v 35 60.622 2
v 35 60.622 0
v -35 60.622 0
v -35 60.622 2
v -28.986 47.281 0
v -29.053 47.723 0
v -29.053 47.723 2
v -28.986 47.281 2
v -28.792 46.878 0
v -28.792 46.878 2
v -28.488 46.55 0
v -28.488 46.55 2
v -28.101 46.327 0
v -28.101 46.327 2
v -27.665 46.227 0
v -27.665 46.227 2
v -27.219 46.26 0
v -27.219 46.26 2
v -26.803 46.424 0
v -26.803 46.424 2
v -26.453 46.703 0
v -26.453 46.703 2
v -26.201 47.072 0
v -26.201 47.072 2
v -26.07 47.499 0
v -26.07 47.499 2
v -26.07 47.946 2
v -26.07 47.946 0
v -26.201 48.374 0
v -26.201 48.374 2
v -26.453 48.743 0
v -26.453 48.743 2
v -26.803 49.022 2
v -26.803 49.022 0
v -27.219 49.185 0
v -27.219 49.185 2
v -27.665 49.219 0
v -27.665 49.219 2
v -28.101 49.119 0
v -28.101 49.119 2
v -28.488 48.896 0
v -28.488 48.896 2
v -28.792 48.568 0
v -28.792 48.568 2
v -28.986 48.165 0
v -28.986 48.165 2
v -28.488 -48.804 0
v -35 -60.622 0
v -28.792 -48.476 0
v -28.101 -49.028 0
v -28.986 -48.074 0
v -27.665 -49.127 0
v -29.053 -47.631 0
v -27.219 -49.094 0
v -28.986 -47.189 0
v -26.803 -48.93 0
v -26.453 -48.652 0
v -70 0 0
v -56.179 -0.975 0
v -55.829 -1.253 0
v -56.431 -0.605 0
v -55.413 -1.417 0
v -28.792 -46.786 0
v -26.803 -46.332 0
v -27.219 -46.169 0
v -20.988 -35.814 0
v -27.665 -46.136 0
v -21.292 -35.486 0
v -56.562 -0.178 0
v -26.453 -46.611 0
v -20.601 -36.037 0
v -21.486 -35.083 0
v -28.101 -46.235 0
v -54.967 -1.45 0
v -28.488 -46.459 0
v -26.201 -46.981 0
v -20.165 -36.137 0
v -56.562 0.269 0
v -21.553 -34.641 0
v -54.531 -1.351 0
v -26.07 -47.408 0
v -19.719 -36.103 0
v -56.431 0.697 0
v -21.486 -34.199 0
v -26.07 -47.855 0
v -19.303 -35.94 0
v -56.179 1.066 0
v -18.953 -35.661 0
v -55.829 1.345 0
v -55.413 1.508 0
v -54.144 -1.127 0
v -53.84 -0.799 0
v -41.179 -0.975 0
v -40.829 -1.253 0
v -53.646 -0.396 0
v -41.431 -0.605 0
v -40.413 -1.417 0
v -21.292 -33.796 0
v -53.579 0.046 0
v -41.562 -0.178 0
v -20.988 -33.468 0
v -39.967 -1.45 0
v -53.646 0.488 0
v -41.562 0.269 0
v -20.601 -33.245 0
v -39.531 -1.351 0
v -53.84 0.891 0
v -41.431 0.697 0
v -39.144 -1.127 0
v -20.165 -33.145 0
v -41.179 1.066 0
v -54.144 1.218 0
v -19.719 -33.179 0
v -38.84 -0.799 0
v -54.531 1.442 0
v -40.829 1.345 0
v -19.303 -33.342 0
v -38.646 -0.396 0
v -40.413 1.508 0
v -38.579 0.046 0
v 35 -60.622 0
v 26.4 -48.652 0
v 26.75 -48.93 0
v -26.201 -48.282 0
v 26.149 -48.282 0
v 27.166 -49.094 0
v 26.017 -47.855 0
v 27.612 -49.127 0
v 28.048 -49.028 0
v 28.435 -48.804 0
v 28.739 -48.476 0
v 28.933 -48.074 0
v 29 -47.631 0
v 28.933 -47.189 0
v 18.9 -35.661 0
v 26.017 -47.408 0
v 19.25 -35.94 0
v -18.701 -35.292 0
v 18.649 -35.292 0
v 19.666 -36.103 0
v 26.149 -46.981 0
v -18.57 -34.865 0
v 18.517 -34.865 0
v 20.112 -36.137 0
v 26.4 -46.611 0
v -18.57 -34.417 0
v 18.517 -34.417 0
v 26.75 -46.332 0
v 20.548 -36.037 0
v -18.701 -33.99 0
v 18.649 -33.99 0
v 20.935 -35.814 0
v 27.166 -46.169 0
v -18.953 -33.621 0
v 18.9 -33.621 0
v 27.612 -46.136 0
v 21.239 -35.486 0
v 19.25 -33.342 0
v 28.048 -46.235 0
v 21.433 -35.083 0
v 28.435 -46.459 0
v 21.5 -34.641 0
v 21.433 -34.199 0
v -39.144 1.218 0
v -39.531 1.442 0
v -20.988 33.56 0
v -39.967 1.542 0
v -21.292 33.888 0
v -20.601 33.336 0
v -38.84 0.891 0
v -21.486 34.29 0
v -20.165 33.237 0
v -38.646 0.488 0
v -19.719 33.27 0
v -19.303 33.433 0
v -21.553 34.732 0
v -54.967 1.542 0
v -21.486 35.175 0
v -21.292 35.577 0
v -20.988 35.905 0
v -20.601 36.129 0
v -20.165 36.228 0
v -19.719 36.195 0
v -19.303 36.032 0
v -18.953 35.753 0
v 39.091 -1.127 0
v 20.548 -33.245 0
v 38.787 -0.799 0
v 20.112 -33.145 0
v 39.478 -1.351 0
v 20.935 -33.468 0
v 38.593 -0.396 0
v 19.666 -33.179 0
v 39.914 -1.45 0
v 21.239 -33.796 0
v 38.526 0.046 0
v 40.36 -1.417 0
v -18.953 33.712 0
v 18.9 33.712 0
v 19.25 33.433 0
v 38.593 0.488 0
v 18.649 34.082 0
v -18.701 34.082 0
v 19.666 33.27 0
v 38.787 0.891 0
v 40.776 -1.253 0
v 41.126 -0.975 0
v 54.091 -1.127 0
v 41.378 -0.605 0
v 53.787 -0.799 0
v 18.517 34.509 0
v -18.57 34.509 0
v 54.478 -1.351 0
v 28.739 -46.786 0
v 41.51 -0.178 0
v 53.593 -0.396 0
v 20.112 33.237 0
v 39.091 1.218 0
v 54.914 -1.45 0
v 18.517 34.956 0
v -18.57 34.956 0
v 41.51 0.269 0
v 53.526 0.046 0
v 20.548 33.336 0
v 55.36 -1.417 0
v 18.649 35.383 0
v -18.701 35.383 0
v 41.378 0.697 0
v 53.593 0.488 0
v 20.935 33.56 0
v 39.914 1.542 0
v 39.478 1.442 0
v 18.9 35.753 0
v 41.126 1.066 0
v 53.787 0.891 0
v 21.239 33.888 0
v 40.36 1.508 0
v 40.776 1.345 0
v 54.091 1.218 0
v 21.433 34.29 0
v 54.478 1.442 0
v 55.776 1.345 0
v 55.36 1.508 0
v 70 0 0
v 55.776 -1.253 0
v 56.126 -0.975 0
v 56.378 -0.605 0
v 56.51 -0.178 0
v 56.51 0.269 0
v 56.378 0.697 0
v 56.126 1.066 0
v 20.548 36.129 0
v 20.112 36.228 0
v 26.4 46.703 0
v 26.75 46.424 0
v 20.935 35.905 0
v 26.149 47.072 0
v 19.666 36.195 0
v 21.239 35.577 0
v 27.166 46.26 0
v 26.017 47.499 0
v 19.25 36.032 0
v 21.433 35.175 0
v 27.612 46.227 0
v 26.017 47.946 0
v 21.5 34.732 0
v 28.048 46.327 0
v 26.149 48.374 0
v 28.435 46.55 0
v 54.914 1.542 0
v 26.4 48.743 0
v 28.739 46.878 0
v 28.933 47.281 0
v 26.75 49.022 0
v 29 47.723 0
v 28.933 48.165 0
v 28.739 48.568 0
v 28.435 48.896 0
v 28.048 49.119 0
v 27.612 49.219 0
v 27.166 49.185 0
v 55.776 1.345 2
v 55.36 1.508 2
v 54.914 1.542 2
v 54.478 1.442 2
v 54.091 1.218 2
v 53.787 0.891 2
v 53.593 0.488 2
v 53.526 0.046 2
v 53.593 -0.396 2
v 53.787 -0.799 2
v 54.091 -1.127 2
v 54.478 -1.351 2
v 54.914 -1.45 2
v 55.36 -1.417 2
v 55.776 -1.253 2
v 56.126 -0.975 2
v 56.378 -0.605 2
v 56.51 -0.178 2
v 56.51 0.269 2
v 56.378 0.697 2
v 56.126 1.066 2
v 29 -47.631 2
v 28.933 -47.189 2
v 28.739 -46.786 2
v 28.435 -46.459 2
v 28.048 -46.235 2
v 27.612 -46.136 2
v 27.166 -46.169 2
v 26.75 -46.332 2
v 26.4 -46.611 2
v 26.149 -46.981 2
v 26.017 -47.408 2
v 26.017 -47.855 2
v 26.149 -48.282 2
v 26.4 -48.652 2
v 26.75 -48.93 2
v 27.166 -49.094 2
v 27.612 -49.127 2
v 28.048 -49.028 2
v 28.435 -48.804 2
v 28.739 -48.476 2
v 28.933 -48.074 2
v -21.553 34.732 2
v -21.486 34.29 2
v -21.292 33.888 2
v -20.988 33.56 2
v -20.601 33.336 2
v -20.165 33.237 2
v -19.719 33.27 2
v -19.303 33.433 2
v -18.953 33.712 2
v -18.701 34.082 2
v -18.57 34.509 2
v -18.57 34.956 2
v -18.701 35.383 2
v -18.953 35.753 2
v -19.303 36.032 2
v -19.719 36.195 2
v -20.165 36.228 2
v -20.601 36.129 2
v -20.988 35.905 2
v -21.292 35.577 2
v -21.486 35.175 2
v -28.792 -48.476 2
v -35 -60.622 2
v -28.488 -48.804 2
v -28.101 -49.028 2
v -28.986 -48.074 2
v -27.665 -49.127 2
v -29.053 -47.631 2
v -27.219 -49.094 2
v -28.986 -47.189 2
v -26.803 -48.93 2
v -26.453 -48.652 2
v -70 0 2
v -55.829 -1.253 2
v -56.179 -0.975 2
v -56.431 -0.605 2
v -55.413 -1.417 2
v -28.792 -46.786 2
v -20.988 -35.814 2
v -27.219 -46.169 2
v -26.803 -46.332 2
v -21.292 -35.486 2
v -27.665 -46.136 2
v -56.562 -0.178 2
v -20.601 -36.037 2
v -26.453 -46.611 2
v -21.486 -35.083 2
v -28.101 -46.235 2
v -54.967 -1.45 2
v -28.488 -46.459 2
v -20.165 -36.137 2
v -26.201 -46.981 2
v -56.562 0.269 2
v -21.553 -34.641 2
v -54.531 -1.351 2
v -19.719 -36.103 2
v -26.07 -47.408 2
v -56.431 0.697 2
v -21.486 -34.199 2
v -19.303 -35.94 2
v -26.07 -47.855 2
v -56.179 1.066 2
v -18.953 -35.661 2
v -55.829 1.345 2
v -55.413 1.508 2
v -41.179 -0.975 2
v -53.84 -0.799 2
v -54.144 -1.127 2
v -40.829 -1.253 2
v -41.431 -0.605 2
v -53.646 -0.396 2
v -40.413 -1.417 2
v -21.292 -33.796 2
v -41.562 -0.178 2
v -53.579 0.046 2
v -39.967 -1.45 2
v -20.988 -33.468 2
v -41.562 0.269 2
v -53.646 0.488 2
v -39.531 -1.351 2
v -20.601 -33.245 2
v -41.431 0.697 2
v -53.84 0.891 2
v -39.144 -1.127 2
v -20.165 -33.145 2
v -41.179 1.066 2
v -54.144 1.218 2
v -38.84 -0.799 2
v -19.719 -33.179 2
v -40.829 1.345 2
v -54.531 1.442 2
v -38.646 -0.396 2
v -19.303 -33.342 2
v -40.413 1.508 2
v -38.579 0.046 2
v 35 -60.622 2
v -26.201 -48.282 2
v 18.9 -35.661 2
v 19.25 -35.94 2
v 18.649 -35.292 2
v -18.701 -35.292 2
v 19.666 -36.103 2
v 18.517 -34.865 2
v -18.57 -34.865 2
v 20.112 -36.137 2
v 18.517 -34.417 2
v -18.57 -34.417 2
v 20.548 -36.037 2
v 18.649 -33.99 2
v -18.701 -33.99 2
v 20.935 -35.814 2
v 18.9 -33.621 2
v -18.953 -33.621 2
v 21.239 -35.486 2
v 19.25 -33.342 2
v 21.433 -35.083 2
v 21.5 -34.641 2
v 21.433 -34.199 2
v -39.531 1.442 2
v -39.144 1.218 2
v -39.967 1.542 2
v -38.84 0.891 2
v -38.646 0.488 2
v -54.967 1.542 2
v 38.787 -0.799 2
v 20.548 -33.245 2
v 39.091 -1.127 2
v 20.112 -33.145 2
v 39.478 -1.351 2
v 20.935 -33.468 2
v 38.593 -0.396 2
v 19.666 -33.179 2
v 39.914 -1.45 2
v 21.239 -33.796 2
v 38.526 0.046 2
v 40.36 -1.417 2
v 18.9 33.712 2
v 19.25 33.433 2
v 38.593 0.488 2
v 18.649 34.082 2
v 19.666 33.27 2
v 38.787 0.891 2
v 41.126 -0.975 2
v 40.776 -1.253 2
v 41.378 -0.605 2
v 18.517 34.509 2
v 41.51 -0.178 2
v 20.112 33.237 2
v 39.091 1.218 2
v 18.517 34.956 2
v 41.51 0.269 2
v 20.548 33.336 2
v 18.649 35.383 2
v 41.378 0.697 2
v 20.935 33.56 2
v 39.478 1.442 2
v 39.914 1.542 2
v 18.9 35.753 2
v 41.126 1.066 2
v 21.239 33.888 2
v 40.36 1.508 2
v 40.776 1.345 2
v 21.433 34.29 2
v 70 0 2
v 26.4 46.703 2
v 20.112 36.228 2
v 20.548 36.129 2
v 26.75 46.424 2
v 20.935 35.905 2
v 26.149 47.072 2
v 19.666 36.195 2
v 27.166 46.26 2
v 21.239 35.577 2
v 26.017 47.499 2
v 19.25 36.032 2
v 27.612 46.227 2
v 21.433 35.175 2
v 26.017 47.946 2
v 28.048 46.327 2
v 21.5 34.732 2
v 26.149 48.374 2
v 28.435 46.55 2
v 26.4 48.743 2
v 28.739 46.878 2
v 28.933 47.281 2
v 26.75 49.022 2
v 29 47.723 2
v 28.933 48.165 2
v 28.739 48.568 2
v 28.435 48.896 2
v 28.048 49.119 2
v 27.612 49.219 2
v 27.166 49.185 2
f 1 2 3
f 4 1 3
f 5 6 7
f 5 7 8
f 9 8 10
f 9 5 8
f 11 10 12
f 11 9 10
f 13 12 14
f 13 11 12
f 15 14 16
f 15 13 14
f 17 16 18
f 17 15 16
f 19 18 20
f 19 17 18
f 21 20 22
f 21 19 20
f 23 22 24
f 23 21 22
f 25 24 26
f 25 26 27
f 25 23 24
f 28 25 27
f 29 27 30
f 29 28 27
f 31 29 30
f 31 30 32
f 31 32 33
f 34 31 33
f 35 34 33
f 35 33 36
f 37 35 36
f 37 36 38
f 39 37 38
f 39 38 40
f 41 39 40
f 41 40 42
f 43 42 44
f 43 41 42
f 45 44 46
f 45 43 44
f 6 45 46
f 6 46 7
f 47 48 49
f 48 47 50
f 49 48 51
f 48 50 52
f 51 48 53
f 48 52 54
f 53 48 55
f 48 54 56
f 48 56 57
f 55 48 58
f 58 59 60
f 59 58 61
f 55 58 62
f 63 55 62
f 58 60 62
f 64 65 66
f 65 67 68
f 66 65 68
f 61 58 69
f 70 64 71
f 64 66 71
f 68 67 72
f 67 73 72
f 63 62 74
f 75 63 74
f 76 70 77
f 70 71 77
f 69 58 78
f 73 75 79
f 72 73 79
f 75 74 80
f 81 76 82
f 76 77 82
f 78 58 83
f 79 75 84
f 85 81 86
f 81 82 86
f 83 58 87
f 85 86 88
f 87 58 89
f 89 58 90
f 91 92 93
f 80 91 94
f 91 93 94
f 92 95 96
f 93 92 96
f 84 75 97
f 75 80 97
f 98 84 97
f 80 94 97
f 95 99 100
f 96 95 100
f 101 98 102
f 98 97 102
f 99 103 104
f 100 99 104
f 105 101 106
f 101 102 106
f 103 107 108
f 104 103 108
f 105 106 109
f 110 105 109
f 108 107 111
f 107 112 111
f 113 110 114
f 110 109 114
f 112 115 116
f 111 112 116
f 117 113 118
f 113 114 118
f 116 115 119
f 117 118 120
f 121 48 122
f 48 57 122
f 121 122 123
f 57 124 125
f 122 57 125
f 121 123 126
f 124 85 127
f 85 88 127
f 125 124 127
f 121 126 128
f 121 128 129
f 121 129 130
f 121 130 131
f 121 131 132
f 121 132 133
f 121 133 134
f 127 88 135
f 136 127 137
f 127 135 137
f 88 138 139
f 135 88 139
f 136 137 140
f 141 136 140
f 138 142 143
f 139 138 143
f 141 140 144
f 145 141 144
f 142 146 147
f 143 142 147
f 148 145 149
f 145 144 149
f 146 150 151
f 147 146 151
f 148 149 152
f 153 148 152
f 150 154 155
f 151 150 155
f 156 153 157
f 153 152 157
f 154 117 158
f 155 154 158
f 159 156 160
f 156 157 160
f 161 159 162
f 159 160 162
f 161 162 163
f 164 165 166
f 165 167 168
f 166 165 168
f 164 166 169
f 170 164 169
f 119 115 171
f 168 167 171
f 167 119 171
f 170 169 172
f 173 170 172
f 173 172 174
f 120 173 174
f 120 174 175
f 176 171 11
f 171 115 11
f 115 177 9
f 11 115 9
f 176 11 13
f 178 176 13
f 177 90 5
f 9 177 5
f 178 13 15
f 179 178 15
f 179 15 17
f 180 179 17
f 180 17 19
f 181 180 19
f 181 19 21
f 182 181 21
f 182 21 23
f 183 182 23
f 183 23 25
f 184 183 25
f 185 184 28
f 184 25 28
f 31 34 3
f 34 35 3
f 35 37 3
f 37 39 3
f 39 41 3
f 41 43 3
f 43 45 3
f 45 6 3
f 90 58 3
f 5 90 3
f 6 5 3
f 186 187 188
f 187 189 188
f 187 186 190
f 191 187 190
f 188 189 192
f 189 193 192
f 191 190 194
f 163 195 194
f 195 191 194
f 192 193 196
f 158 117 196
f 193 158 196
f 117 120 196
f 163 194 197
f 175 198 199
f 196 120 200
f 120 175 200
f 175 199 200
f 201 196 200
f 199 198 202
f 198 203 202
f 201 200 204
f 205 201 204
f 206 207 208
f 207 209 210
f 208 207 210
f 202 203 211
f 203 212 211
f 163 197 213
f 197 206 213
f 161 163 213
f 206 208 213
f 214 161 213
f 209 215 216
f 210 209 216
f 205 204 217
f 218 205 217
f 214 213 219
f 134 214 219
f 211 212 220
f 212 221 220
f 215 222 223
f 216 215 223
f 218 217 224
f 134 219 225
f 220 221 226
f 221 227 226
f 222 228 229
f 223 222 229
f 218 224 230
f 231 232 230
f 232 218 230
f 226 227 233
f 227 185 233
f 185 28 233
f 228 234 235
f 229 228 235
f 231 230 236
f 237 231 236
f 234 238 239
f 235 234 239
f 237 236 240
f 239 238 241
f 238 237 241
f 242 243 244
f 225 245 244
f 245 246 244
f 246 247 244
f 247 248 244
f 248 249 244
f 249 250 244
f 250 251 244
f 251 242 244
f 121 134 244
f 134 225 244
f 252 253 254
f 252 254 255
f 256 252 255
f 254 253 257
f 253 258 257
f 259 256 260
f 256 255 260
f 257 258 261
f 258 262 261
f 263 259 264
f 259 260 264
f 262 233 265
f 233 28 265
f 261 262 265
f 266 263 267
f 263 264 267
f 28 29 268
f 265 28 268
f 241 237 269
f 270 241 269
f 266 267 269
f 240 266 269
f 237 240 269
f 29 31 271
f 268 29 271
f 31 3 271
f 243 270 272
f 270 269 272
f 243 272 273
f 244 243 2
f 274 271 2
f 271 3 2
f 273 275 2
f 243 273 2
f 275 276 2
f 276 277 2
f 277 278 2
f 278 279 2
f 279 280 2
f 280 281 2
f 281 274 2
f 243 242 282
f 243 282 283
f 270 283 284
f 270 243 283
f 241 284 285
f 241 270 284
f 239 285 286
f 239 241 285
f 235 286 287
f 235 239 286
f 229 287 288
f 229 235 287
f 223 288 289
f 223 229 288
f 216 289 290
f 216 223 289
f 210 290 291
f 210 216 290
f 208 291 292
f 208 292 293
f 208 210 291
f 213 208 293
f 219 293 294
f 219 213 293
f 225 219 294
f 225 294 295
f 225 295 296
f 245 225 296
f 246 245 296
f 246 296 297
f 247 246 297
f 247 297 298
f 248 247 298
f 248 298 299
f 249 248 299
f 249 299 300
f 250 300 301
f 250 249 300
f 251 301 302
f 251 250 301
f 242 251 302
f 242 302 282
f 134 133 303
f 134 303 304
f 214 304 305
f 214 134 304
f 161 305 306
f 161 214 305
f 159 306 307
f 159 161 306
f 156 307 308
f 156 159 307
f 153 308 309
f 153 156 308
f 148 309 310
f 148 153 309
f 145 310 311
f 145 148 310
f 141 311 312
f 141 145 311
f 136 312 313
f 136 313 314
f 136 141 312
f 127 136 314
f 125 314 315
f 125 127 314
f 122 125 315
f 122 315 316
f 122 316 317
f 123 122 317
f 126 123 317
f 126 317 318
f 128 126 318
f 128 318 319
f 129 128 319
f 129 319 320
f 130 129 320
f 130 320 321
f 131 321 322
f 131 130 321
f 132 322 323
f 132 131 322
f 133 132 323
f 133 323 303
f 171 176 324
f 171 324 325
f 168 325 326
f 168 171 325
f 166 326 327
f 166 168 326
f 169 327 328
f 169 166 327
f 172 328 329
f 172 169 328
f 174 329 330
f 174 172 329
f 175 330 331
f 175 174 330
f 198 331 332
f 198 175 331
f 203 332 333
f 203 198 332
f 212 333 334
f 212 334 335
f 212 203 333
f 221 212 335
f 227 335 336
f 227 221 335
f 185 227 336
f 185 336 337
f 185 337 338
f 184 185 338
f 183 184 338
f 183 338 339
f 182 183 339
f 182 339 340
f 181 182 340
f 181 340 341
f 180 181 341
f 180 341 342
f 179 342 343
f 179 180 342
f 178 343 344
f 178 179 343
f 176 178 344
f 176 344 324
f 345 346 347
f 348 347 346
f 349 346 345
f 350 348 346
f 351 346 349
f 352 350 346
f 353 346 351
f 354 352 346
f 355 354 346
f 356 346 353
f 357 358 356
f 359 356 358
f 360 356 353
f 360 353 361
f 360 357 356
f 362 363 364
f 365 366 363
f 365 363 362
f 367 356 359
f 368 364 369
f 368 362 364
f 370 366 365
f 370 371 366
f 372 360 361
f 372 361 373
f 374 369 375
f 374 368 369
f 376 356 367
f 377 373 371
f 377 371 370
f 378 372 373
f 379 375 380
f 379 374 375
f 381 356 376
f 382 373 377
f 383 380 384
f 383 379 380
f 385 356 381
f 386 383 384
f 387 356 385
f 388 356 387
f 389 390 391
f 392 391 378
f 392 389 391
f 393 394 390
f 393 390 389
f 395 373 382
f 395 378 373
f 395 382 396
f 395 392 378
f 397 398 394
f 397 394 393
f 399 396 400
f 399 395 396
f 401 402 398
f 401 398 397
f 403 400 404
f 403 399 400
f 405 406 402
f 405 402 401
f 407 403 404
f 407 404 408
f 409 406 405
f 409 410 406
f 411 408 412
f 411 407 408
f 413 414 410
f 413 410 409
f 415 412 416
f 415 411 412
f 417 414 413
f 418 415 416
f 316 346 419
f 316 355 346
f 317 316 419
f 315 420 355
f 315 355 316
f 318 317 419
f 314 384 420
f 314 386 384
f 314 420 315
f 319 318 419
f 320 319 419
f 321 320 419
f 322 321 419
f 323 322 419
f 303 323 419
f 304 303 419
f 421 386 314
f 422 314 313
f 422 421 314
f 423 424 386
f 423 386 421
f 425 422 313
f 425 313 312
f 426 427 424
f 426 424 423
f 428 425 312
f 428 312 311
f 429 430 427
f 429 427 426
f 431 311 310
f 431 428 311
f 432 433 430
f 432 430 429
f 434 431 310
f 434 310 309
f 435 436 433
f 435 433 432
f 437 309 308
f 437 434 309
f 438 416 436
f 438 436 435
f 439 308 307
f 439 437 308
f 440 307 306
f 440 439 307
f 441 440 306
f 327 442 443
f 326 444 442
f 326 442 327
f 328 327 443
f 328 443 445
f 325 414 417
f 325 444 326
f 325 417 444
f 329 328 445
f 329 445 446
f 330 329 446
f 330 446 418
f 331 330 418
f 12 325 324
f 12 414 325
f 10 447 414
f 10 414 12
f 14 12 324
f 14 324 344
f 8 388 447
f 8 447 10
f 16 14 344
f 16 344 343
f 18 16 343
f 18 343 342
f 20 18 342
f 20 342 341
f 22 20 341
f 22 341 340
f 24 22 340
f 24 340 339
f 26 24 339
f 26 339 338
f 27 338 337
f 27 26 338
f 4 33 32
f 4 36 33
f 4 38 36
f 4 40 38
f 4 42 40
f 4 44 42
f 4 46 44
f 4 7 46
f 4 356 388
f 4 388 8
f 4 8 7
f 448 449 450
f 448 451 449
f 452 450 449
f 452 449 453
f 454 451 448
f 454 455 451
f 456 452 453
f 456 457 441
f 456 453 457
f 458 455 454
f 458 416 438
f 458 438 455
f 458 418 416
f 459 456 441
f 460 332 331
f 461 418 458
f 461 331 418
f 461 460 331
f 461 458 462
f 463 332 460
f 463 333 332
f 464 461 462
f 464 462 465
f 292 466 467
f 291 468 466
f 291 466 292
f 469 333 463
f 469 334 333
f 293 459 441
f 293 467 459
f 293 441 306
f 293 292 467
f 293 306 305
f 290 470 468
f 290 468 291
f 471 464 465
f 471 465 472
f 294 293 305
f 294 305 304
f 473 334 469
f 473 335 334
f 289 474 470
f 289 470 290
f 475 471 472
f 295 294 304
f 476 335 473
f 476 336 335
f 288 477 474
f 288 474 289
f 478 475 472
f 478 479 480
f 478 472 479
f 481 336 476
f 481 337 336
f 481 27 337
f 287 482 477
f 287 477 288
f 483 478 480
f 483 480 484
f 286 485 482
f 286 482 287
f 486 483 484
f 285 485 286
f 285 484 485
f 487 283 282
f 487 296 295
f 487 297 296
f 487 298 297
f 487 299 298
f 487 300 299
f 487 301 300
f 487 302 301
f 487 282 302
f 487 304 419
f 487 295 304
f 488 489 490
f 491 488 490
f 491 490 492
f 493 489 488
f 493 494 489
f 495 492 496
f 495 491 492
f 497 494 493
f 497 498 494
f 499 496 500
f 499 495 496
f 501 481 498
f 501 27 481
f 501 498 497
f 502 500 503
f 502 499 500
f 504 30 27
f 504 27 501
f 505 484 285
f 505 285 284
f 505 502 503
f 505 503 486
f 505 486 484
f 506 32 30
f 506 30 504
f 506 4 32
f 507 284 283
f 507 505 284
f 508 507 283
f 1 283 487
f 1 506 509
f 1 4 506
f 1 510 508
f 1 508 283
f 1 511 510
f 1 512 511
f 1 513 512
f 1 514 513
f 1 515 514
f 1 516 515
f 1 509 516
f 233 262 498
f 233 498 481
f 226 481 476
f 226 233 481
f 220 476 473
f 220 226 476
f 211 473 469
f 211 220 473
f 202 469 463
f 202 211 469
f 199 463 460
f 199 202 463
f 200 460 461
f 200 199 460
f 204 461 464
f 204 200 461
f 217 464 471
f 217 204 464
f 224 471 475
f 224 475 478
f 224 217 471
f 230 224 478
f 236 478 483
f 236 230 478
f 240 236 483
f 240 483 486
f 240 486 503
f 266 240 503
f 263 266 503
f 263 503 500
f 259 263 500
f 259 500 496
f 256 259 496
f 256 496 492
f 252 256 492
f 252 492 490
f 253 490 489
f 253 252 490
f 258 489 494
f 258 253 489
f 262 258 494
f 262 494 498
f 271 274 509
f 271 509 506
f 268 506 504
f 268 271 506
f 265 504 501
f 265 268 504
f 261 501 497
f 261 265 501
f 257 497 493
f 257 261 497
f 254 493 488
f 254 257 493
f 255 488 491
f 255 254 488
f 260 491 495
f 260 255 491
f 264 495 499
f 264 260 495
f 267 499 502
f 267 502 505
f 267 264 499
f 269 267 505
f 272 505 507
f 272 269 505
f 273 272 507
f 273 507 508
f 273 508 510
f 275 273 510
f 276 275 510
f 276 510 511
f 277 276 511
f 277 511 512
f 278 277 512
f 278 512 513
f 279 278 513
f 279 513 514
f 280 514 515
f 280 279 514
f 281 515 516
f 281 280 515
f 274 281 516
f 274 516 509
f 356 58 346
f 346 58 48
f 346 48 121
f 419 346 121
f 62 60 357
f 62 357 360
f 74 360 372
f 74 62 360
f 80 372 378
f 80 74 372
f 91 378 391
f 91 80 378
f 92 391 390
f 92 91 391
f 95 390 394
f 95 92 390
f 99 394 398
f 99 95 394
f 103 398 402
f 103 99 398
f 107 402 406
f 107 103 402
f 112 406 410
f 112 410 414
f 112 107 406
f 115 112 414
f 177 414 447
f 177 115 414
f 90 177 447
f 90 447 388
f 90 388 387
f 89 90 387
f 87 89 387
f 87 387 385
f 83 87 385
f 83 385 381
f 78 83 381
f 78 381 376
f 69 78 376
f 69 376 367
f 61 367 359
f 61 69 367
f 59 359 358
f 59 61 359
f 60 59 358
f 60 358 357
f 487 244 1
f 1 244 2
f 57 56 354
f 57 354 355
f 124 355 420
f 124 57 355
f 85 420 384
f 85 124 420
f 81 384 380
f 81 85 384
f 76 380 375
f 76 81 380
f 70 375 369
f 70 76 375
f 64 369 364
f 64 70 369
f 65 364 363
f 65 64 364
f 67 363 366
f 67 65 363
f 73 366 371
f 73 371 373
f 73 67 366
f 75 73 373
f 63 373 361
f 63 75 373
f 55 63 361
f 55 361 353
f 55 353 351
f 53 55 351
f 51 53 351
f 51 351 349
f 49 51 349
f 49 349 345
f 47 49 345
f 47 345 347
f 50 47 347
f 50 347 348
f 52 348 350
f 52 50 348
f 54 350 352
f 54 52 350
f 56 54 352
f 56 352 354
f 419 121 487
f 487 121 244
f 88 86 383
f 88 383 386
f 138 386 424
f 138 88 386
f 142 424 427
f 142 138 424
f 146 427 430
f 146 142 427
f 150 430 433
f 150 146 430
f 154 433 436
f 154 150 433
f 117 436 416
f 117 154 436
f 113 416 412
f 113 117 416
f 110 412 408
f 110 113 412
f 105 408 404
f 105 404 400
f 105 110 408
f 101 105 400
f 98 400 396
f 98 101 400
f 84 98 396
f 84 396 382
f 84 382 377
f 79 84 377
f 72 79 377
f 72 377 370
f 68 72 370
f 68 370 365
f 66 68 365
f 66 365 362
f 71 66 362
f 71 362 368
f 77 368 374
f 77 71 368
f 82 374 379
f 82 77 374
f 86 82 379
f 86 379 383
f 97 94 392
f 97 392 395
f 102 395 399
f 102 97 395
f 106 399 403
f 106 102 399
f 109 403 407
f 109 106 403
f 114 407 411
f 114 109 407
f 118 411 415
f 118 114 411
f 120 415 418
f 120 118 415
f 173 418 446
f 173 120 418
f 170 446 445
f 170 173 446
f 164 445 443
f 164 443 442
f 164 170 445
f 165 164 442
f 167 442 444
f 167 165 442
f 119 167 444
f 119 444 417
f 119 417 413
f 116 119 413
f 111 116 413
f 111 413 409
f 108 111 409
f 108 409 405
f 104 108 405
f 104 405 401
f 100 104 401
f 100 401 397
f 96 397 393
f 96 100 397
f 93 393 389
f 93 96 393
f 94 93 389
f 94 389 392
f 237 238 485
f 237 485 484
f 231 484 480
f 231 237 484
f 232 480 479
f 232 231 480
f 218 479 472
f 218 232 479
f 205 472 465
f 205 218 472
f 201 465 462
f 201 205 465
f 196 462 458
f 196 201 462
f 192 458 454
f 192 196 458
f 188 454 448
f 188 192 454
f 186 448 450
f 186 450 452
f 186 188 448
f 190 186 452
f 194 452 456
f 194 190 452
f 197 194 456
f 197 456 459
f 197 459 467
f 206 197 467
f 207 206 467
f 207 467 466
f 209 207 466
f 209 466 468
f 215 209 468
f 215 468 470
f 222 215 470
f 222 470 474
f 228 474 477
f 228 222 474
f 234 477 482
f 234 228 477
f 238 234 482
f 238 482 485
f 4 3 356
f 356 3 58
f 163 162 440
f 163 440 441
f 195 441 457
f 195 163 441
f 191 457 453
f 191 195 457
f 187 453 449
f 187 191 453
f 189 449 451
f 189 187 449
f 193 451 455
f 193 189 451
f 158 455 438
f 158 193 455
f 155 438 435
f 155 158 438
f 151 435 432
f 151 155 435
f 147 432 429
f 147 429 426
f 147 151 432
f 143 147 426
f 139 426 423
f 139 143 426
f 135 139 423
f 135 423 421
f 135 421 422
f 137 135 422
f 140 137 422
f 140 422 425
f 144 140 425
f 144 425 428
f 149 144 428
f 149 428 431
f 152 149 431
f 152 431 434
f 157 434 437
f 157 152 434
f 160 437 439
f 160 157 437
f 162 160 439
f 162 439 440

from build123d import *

# Parameters (mm, degrees)
BOSS_EXTRUDE1_DEPTH = 2
SKETCH3_R           = 1.5
CUT_EXTRUDE1_DEPTH  = 2
CIRPATTERN1_COUNT   = 6


with BuildPart() as part:
    # Sketch2 → Boss-Extrude1 (new body)
    with BuildSketch(Plane.XY):
        Polygon((35, -60.621778265), (70, 0), (35, 60.621778265), (-35, 60.621778265), (-70, 0), (-35, -60.621778265), align=None)
    extrude(amount=BOSS_EXTRUDE1_DEPTH)

    # Sketch3 → Cut-Extrude1 (cut)
    with BuildSketch(Plane.XY):
        with Locations((27.5, -47.631397208)):
            Circle(SKETCH3_R)
        with Locations((20, -34.641016151)):
            Circle(SKETCH3_R)
    cut_extrude1 = extrude(amount=CUT_EXTRUDE1_DEPTH, mode=Mode.SUBTRACT)

    # CirPattern1: Cut-Extrude1 ×6 about axis
    cirpattern1_axis = Axis((-0.026403444, 0.045732107, 0), (0, 0, 1))
    for i in range(1, CIRPATTERN1_COUNT):
        add(cut_extrude1.rotate(cirpattern1_axis, i * 360 / CIRPATTERN1_COUNT), mode=Mode.SUBTRACT)


solid = part.part
